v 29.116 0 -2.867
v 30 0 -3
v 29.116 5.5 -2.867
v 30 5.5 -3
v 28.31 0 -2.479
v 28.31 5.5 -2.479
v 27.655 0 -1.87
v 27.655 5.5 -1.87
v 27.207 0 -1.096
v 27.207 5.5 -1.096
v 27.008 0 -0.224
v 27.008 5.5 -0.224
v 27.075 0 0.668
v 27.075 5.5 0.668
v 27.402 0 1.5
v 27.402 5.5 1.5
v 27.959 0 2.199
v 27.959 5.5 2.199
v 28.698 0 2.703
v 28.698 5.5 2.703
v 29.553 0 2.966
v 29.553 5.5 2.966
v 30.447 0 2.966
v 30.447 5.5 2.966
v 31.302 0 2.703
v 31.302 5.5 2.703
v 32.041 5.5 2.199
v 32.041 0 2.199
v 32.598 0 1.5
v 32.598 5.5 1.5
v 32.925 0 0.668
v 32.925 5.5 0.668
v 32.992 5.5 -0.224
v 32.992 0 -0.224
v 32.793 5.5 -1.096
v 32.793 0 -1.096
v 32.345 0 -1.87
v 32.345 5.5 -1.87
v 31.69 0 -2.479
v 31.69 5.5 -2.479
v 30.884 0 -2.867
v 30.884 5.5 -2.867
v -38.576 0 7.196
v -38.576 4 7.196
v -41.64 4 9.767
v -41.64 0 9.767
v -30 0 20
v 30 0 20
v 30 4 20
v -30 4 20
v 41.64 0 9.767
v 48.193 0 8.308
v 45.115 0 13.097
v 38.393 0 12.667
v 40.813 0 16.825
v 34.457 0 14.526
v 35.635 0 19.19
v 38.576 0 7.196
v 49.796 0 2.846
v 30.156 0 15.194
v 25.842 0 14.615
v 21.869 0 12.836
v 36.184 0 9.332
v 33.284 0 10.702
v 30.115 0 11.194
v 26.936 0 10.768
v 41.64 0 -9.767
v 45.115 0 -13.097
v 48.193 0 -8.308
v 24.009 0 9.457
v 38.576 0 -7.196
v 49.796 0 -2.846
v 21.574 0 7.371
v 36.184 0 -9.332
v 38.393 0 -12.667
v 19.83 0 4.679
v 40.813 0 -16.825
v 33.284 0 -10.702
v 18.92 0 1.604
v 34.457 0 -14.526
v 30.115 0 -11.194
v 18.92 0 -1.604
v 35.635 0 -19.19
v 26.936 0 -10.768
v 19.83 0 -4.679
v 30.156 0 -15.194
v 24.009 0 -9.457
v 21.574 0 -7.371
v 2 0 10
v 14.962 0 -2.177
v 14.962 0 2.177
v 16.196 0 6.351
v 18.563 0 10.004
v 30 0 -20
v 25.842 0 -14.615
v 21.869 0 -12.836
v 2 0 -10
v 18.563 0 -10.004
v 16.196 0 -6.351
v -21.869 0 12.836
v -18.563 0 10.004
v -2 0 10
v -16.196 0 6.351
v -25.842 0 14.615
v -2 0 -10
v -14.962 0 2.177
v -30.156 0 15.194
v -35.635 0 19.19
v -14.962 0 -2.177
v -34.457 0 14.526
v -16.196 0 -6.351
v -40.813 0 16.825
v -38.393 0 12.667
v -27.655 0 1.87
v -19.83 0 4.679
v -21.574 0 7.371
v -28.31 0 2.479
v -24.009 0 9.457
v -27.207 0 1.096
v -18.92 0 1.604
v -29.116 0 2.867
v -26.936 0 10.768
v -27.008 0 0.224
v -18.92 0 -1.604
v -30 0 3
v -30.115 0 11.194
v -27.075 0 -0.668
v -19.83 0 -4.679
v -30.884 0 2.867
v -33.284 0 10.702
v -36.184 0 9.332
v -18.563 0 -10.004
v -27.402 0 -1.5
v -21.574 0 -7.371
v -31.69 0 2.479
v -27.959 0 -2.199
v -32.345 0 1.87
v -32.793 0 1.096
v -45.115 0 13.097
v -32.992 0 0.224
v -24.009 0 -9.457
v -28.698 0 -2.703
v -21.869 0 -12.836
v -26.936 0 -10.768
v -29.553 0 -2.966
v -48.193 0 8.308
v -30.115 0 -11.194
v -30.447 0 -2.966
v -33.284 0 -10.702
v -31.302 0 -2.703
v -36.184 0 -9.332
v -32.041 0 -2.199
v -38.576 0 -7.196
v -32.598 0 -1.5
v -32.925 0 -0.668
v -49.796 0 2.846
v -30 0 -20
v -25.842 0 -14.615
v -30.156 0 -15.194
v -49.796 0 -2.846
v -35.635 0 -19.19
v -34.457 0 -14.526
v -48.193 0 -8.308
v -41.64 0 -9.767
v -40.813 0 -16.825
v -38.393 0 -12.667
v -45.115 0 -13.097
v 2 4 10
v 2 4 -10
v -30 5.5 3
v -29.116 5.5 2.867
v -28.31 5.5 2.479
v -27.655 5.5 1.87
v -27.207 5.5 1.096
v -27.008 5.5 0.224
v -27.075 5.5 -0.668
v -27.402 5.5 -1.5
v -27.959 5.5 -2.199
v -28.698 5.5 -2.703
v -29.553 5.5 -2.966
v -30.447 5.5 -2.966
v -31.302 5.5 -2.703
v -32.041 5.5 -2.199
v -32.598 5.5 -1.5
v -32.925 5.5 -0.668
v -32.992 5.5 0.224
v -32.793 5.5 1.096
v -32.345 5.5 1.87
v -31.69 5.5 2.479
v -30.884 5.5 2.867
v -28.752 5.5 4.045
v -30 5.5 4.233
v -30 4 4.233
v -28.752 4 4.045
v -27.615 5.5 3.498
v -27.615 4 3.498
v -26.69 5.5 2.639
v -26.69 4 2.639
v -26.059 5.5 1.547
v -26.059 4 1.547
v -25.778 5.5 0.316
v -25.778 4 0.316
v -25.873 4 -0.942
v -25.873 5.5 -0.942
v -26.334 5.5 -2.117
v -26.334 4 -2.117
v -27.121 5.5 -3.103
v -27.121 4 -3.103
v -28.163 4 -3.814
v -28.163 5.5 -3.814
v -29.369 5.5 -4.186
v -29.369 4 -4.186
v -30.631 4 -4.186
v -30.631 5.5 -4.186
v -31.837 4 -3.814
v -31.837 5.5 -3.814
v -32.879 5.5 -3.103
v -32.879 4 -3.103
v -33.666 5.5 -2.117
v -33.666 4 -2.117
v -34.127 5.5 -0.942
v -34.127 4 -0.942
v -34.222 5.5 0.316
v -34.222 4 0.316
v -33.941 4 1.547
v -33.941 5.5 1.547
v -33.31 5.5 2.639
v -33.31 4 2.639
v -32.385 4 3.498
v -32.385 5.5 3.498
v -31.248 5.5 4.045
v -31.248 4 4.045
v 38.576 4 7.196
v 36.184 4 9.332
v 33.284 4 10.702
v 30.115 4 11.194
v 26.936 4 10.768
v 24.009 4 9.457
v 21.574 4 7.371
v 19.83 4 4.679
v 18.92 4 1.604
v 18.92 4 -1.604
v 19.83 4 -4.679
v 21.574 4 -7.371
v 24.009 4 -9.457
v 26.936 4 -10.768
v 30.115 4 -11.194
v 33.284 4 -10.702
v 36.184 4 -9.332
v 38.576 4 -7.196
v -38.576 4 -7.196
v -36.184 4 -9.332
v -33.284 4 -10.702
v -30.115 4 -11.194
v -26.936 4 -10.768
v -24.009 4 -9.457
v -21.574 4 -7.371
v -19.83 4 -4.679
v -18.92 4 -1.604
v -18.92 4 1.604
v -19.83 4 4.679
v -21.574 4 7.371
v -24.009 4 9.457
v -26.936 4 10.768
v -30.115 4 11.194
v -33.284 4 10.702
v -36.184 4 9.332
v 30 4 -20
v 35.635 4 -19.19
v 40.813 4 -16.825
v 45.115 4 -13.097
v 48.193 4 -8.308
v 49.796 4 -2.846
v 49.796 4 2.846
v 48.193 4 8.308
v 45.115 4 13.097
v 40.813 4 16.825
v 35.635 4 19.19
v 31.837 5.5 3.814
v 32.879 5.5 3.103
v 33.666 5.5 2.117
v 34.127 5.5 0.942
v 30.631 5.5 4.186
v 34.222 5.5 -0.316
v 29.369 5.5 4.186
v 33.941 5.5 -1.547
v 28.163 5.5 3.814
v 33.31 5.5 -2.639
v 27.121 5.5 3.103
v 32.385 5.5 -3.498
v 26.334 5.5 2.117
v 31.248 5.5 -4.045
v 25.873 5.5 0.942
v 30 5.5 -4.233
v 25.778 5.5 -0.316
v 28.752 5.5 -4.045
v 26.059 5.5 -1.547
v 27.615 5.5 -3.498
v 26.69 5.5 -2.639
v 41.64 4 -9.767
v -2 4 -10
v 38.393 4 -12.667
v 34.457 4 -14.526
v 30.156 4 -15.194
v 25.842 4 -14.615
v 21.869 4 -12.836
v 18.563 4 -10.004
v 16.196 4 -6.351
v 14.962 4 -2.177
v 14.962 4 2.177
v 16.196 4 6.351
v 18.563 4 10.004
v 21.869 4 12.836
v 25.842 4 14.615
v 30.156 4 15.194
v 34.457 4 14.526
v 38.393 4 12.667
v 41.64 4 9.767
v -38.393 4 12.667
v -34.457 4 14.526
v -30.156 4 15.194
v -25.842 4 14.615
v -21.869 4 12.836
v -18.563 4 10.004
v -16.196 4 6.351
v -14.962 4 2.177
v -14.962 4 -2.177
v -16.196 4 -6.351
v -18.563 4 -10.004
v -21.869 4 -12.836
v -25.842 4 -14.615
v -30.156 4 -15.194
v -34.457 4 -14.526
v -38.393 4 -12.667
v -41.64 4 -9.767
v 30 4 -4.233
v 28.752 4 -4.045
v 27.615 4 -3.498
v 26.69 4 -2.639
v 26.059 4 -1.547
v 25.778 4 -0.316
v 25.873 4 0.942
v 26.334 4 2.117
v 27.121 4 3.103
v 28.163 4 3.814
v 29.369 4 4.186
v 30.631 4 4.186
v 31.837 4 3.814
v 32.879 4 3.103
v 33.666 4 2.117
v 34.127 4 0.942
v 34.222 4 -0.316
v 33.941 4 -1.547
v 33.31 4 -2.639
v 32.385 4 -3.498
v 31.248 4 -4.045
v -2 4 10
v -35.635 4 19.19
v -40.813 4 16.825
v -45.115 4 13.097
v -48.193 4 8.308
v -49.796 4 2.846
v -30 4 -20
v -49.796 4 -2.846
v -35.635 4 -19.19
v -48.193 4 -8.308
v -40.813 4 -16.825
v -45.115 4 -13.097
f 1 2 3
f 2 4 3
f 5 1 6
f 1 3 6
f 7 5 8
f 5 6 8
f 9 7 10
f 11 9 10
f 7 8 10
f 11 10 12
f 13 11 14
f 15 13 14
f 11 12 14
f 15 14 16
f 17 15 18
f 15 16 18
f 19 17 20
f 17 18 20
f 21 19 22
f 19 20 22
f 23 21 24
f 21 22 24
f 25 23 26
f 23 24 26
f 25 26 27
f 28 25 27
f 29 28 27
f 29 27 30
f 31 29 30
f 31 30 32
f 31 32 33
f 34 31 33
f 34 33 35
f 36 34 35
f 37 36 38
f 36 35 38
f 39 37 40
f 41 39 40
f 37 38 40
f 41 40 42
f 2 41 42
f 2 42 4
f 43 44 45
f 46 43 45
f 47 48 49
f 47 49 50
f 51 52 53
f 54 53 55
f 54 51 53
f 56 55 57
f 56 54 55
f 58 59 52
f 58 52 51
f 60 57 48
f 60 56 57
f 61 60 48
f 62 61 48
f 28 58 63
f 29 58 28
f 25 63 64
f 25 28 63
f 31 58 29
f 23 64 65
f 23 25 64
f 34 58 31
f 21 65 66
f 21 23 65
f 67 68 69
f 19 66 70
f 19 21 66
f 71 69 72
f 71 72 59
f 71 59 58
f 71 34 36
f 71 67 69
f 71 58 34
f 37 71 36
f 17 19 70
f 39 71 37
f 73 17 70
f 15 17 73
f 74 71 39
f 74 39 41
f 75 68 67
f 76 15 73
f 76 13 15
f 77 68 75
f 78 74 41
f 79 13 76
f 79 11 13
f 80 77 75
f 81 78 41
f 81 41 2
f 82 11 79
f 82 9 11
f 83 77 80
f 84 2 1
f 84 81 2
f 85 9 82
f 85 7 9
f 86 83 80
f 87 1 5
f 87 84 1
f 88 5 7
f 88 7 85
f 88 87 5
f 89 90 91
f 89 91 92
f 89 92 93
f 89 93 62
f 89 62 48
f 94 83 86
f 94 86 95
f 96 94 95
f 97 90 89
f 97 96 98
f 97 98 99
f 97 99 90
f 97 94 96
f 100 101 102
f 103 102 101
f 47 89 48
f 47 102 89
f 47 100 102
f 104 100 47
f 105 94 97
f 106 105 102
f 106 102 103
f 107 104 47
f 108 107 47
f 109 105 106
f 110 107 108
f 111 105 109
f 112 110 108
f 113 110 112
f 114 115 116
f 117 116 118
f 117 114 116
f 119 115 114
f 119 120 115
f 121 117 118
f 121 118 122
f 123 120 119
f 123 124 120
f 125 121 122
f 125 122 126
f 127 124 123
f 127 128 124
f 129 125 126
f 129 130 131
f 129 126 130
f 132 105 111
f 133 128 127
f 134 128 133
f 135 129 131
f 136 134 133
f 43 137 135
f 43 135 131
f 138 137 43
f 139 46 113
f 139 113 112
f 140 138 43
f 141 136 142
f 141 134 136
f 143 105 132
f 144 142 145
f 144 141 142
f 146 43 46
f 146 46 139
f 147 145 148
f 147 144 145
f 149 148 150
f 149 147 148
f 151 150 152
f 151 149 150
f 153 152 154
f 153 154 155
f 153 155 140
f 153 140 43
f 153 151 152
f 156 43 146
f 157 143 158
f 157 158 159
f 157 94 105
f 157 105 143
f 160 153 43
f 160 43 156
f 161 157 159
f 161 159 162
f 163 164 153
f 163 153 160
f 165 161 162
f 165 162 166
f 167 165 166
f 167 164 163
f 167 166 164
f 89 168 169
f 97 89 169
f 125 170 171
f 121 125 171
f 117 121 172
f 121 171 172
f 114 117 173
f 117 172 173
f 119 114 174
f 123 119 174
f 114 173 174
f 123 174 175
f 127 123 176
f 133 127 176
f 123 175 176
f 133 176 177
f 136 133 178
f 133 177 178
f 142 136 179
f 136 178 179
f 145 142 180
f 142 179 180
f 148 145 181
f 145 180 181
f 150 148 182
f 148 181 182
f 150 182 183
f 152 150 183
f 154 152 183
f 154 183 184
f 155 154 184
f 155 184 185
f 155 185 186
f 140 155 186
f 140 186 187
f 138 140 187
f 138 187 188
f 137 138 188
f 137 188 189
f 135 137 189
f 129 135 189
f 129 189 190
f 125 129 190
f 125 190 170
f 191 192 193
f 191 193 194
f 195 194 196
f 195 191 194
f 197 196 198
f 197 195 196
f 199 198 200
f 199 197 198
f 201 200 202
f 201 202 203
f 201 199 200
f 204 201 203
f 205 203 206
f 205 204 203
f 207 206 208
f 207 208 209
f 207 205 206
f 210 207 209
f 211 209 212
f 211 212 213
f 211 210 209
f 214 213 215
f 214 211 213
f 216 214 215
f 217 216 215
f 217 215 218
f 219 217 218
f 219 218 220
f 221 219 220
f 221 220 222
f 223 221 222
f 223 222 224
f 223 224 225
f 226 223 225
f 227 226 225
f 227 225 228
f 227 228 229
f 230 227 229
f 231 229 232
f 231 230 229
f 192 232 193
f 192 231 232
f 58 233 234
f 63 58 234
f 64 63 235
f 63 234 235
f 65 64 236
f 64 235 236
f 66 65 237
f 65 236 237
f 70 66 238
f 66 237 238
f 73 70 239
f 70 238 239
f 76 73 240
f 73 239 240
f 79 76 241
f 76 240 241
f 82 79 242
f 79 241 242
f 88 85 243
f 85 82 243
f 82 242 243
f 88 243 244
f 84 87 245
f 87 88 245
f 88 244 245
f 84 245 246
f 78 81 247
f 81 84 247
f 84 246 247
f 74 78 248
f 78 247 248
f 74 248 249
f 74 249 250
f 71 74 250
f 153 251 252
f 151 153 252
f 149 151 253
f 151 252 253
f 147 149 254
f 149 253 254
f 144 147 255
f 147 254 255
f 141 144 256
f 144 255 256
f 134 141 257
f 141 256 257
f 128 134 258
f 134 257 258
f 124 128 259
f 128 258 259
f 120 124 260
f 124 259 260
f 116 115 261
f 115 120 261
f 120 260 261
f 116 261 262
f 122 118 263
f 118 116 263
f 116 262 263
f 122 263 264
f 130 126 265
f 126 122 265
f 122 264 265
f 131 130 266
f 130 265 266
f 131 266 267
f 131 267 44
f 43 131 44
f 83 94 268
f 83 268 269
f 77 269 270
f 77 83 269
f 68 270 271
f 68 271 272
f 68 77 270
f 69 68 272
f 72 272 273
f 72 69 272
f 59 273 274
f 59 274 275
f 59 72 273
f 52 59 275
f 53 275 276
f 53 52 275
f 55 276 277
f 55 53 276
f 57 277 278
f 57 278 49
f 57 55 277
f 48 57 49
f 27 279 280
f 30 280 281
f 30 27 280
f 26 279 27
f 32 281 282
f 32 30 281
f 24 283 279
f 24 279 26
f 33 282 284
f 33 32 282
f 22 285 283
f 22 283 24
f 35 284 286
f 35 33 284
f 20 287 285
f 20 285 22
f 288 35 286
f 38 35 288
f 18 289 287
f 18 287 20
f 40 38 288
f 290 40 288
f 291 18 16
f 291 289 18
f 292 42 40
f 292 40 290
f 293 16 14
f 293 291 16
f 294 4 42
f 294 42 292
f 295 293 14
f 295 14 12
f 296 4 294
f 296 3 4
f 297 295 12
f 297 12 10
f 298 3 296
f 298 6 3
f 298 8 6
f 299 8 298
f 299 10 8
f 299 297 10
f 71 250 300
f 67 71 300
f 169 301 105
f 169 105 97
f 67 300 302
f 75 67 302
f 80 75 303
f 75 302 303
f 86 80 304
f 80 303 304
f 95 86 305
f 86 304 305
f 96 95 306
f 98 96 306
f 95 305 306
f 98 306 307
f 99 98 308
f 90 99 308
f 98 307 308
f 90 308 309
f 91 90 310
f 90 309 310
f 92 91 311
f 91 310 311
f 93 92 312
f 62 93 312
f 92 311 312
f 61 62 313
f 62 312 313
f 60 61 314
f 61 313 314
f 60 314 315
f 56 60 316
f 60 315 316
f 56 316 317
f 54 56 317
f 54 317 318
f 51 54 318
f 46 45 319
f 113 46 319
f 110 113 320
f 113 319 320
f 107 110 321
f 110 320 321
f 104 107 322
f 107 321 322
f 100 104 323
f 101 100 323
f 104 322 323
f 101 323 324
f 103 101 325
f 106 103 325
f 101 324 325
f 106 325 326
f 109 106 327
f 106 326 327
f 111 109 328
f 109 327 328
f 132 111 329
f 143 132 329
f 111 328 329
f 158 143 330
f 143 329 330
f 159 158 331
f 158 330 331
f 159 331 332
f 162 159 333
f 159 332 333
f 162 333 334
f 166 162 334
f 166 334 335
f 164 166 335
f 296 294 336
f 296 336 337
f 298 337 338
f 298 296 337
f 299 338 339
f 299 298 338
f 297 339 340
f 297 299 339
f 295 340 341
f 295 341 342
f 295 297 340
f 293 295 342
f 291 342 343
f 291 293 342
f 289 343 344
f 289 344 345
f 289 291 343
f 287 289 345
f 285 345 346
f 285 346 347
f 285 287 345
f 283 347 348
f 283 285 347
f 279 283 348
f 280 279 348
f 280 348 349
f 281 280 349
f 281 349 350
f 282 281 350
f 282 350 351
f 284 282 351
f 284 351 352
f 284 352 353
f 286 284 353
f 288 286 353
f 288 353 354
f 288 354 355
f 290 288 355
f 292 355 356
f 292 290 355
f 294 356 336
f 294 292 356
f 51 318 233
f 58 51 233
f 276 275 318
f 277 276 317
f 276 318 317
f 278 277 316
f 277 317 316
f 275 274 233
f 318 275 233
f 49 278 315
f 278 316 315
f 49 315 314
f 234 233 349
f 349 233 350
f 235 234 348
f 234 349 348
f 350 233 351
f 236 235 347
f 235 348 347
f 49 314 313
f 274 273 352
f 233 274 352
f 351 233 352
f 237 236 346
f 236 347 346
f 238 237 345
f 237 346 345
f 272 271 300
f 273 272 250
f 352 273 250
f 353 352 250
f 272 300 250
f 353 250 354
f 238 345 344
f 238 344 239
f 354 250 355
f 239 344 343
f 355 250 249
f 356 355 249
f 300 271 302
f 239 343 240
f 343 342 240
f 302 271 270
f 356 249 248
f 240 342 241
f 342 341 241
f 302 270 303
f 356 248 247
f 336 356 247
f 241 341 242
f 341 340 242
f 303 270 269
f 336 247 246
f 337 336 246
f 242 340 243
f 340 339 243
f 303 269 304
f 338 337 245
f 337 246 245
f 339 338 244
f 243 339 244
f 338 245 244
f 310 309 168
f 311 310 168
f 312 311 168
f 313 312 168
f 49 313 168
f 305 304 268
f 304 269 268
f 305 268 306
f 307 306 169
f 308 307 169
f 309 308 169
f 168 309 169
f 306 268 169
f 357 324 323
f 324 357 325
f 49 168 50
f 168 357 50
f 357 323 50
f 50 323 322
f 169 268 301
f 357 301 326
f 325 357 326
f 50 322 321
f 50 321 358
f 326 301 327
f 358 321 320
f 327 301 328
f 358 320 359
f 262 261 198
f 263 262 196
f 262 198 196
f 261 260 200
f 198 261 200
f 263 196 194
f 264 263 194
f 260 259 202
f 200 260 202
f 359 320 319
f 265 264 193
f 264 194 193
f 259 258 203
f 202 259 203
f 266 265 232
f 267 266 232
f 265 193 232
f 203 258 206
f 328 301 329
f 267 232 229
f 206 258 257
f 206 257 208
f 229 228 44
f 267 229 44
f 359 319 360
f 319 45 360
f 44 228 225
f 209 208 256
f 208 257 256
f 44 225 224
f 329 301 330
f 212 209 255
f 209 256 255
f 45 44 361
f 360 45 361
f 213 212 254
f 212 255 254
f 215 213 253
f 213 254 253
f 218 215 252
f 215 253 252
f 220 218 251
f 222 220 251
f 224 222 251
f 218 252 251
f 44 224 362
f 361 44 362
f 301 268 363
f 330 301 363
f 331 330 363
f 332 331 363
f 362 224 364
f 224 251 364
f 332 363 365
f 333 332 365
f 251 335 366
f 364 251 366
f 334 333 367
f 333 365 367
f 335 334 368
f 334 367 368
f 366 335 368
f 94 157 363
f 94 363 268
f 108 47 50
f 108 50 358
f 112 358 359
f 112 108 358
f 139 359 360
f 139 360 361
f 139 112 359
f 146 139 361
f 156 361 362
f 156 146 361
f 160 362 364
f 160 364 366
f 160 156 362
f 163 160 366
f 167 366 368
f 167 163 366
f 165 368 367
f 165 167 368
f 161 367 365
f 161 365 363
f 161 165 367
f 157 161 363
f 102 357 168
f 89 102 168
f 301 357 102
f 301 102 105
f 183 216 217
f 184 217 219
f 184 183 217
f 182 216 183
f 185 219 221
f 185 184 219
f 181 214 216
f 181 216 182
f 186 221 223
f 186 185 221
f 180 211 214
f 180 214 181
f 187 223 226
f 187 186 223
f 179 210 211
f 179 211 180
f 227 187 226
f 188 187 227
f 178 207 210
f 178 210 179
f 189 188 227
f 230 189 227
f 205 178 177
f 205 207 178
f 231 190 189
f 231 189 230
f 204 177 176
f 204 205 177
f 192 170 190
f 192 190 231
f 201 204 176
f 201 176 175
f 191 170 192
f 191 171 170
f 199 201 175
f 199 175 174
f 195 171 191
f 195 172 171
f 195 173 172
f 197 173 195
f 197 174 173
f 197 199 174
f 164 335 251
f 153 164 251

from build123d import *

# Parameters (mm, degrees)
BOSS_EXTRUDE1_DEPTH = 4.000000128
SKETCH2_R           = 2.999994
SKETCH2_W           = 3.999992
SKETCH2_H           = 20.0000108
CUT_EXTRUDE1_DEPTH  = 54.999999958
BOSS_EXTRUDE2_START = 1.499997
SKETCH3_R           = 4.2333418
SKETCH3_R_2         = 2.999994
BOSS_EXTRUDE2_DEPTH = 1.499997


with BuildPart() as part:
    # Sketch1 → Boss-Extrude1 (new body)
    with BuildSketch(Plane(origin=(0, 0, 0), x_dir=(1, 0, 0), z_dir=(0, 1, 0))):
        with BuildLine():
            Line((-29.999999944, 20), (29.999999944, 20))
            ThreePointArc((29.999999944, 20), (49.999999944, 0), (29.999999944, -20))
            Line((29.999999944, -20), (-29.999999944, -20))
            ThreePointArc((-29.999999944, -20), (-49.999999944, 0), (-29.999999944, 20))
        make_face()
    extrude(amount=BOSS_EXTRUDE1_DEPTH)

    # Sketch2 → Cut-Extrude1 (cut, through all)
    with BuildSketch(Plane(origin=(0, 4.000000128, 0), x_dir=(1, 0, 0), z_dir=(0, 1, 0))):
        with Locations(Location((-29.999999944, 0, 0), (0, 0, 270))):
            Circle(SKETCH2_R)
        with Locations(Location((29.999999944, 0, 0), (0, 0, 90))):
            Circle(SKETCH2_R)
        Rectangle(SKETCH2_W, SKETCH2_H)
        with BuildLine():
            Line((-41.640032544, 9.7671636), (-38.575878144, 7.1959978))
            ThreePointArc((-38.575878144, 7.1959978), (-18.804997879, 0), (-38.575878144, -7.1959978))
            Line((-38.575878144, -7.1959978), (-41.640032544, -9.7671636))
            ThreePointArc((-41.640032544, -9.7671636), (-14.805005909, 0), (-41.640032544, 9.7671636))
        make_face()
        with BuildLine():
            Line((41.640032544, -9.7671636), (38.575878144, -7.1959978))
            ThreePointArc((38.575878144, -7.1959978), (18.804997879, 0), (38.575878144, 7.1959978))
            Line((38.575878144, 7.1959978), (41.640032544, 9.7671636))
            ThreePointArc((41.640032544, 9.7671636), (14.805005909, 0), (41.640032544, -9.7671636))
        make_face()
    extrude(amount=-CUT_EXTRUDE1_DEPTH, mode=Mode.SUBTRACT)

    # Sketch3 → Boss-Extrude2 (add)
    # profile 1 of 2: a face of its own
    with BuildSketch(Plane(origin=(0, 4.000000128, 0), x_dir=(1, 0, 0), z_dir=(0, 1, 0)).offset(BOSS_EXTRUDE2_START)):
        with Locations(Location((-29.999999944, 0, 0), (0, 0, 270))):
            Circle(SKETCH3_R)
        with Locations(Location((-29.999999944, 0, 0), (0, 0, 270))):
            Circle(SKETCH3_R_2, mode=Mode.SUBTRACT)
    # profile 2 of 2: a face of its own
    with BuildSketch(Plane(origin=(0, 4.000000128, 0), x_dir=(1, 0, 0), z_dir=(0, 1, 0)).offset(BOSS_EXTRUDE2_START)):
        with Locations(Location((29.999999944, 0, 0), (0, 0, 90))):
            Circle(SKETCH3_R)
        with Locations(Location((29.999999944, 0, 0), (0, 0, 90))):
            Circle(SKETCH3_R_2, mode=Mode.SUBTRACT)
    extrude(amount=-BOSS_EXTRUDE2_DEPTH)


solid = part.part
